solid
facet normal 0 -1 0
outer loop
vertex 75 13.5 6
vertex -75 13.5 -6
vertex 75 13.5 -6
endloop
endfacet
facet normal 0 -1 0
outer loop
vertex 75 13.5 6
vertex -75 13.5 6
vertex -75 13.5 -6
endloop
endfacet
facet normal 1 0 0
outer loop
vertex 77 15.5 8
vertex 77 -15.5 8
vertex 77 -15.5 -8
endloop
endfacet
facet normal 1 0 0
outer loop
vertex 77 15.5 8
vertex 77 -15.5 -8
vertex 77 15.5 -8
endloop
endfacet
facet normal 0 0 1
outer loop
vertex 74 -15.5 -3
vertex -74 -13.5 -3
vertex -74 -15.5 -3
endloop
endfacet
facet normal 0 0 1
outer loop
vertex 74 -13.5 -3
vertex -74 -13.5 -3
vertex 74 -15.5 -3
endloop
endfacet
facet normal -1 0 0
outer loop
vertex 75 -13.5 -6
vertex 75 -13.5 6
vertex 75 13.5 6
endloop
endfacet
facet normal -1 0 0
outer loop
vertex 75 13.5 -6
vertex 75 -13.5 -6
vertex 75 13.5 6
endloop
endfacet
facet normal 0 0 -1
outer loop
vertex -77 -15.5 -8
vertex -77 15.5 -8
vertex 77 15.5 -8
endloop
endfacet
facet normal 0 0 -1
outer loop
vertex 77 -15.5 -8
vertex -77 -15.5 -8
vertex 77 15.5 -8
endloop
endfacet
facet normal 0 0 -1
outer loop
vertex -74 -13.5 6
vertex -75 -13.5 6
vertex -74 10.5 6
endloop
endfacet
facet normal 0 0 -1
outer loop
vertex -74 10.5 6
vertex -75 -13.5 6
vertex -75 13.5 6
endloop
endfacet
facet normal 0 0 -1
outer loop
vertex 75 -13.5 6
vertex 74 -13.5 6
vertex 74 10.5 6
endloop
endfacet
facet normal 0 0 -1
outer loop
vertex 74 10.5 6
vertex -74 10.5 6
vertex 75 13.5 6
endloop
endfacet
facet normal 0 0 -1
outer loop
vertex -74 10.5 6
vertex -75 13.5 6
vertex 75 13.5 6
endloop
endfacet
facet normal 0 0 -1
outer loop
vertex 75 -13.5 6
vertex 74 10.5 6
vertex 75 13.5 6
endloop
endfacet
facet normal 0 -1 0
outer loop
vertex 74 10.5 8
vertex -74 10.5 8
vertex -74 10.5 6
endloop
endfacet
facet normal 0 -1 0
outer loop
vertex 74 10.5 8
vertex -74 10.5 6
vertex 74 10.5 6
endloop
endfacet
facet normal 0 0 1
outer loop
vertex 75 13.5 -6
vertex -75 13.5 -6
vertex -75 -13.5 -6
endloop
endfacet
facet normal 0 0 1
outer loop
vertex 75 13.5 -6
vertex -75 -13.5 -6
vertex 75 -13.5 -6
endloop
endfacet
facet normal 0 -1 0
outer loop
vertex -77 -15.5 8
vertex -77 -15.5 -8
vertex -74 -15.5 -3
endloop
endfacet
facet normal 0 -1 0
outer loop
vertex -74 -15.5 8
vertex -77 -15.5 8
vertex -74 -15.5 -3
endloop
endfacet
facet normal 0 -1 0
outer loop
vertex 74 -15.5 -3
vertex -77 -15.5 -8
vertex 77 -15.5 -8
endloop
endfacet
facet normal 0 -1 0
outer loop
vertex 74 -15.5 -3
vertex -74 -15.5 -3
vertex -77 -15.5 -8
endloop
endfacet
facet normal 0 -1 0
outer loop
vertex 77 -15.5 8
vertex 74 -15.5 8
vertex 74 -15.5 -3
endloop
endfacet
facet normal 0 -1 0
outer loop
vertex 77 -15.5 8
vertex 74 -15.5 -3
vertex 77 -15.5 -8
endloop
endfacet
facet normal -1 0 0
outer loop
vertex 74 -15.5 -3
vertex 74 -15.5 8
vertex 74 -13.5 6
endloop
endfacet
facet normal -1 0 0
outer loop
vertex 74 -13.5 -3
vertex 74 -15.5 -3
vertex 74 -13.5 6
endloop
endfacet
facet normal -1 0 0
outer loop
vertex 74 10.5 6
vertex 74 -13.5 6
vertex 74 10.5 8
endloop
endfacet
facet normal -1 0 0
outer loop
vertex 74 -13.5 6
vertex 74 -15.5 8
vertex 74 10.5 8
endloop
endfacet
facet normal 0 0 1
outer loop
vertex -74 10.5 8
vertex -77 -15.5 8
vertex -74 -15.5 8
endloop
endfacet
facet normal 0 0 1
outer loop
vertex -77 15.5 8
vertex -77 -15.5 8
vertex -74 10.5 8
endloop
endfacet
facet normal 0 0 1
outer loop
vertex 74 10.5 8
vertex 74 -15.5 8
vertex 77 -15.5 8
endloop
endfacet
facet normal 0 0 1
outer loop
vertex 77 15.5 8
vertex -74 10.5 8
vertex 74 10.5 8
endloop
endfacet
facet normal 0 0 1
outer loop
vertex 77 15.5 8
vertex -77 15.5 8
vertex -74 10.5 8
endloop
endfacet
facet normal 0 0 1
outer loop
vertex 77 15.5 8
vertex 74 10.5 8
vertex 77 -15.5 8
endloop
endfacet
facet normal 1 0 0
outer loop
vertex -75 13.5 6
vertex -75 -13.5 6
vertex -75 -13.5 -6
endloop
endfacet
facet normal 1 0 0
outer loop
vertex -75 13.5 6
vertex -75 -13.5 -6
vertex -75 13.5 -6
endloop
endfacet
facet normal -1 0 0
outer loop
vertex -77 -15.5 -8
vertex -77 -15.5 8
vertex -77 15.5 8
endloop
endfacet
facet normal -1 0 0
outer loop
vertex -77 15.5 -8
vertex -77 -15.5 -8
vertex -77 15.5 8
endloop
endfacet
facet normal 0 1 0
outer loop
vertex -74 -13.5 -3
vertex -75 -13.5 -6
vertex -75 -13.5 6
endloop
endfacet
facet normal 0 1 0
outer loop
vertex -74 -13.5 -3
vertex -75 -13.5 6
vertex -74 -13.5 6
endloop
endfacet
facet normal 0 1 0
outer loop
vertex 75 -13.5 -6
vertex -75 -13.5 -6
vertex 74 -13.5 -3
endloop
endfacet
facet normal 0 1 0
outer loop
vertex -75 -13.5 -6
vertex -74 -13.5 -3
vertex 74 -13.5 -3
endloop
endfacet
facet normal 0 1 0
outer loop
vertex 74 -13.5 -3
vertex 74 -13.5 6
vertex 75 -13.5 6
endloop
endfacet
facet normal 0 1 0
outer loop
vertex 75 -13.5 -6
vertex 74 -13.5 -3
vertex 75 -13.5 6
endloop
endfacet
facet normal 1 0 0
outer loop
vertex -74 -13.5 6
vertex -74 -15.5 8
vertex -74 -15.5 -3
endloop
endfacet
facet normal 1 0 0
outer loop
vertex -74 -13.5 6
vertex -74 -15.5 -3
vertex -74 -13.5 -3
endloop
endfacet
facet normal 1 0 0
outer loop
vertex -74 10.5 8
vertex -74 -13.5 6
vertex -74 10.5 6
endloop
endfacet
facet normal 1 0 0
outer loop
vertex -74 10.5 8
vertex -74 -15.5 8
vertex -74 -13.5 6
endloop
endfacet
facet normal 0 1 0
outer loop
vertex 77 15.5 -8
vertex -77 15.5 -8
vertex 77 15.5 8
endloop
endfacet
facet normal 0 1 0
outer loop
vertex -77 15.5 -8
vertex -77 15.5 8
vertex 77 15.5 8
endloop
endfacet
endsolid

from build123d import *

# Parameters (mm, degrees)
F0_W     = 154
F0_H     = 31
F1_DEPTH = 8
F2_W     = 150
F2_H     = 27
F3_DEPTH = 6
F4_W     = 148
F4_H     = 26
F5_DEPTH = 11


with BuildPart() as f1:
    # F0 (on Top) → F1 (new body, symmetric)
    with BuildSketch(Plane.XY):
        Rectangle(F0_W, F0_H)
    extrude(amount=F1_DEPTH, both=True)

    # F2 (on Top) → F3 (cut, symmetric)
    with BuildSketch(Plane.XY):
        Rectangle(F2_W, F2_H)
    extrude(amount=F3_DEPTH, both=True, mode=Mode.SUBTRACT)

    # F4 (on face) → F5 (cut)
    with BuildSketch(Plane.XY.offset(8)):
        with Locations((0, -2.5)):
            Rectangle(F4_W, F4_H)
    extrude(amount=-F5_DEPTH, mode=Mode.SUBTRACT)


solid = f1.part
